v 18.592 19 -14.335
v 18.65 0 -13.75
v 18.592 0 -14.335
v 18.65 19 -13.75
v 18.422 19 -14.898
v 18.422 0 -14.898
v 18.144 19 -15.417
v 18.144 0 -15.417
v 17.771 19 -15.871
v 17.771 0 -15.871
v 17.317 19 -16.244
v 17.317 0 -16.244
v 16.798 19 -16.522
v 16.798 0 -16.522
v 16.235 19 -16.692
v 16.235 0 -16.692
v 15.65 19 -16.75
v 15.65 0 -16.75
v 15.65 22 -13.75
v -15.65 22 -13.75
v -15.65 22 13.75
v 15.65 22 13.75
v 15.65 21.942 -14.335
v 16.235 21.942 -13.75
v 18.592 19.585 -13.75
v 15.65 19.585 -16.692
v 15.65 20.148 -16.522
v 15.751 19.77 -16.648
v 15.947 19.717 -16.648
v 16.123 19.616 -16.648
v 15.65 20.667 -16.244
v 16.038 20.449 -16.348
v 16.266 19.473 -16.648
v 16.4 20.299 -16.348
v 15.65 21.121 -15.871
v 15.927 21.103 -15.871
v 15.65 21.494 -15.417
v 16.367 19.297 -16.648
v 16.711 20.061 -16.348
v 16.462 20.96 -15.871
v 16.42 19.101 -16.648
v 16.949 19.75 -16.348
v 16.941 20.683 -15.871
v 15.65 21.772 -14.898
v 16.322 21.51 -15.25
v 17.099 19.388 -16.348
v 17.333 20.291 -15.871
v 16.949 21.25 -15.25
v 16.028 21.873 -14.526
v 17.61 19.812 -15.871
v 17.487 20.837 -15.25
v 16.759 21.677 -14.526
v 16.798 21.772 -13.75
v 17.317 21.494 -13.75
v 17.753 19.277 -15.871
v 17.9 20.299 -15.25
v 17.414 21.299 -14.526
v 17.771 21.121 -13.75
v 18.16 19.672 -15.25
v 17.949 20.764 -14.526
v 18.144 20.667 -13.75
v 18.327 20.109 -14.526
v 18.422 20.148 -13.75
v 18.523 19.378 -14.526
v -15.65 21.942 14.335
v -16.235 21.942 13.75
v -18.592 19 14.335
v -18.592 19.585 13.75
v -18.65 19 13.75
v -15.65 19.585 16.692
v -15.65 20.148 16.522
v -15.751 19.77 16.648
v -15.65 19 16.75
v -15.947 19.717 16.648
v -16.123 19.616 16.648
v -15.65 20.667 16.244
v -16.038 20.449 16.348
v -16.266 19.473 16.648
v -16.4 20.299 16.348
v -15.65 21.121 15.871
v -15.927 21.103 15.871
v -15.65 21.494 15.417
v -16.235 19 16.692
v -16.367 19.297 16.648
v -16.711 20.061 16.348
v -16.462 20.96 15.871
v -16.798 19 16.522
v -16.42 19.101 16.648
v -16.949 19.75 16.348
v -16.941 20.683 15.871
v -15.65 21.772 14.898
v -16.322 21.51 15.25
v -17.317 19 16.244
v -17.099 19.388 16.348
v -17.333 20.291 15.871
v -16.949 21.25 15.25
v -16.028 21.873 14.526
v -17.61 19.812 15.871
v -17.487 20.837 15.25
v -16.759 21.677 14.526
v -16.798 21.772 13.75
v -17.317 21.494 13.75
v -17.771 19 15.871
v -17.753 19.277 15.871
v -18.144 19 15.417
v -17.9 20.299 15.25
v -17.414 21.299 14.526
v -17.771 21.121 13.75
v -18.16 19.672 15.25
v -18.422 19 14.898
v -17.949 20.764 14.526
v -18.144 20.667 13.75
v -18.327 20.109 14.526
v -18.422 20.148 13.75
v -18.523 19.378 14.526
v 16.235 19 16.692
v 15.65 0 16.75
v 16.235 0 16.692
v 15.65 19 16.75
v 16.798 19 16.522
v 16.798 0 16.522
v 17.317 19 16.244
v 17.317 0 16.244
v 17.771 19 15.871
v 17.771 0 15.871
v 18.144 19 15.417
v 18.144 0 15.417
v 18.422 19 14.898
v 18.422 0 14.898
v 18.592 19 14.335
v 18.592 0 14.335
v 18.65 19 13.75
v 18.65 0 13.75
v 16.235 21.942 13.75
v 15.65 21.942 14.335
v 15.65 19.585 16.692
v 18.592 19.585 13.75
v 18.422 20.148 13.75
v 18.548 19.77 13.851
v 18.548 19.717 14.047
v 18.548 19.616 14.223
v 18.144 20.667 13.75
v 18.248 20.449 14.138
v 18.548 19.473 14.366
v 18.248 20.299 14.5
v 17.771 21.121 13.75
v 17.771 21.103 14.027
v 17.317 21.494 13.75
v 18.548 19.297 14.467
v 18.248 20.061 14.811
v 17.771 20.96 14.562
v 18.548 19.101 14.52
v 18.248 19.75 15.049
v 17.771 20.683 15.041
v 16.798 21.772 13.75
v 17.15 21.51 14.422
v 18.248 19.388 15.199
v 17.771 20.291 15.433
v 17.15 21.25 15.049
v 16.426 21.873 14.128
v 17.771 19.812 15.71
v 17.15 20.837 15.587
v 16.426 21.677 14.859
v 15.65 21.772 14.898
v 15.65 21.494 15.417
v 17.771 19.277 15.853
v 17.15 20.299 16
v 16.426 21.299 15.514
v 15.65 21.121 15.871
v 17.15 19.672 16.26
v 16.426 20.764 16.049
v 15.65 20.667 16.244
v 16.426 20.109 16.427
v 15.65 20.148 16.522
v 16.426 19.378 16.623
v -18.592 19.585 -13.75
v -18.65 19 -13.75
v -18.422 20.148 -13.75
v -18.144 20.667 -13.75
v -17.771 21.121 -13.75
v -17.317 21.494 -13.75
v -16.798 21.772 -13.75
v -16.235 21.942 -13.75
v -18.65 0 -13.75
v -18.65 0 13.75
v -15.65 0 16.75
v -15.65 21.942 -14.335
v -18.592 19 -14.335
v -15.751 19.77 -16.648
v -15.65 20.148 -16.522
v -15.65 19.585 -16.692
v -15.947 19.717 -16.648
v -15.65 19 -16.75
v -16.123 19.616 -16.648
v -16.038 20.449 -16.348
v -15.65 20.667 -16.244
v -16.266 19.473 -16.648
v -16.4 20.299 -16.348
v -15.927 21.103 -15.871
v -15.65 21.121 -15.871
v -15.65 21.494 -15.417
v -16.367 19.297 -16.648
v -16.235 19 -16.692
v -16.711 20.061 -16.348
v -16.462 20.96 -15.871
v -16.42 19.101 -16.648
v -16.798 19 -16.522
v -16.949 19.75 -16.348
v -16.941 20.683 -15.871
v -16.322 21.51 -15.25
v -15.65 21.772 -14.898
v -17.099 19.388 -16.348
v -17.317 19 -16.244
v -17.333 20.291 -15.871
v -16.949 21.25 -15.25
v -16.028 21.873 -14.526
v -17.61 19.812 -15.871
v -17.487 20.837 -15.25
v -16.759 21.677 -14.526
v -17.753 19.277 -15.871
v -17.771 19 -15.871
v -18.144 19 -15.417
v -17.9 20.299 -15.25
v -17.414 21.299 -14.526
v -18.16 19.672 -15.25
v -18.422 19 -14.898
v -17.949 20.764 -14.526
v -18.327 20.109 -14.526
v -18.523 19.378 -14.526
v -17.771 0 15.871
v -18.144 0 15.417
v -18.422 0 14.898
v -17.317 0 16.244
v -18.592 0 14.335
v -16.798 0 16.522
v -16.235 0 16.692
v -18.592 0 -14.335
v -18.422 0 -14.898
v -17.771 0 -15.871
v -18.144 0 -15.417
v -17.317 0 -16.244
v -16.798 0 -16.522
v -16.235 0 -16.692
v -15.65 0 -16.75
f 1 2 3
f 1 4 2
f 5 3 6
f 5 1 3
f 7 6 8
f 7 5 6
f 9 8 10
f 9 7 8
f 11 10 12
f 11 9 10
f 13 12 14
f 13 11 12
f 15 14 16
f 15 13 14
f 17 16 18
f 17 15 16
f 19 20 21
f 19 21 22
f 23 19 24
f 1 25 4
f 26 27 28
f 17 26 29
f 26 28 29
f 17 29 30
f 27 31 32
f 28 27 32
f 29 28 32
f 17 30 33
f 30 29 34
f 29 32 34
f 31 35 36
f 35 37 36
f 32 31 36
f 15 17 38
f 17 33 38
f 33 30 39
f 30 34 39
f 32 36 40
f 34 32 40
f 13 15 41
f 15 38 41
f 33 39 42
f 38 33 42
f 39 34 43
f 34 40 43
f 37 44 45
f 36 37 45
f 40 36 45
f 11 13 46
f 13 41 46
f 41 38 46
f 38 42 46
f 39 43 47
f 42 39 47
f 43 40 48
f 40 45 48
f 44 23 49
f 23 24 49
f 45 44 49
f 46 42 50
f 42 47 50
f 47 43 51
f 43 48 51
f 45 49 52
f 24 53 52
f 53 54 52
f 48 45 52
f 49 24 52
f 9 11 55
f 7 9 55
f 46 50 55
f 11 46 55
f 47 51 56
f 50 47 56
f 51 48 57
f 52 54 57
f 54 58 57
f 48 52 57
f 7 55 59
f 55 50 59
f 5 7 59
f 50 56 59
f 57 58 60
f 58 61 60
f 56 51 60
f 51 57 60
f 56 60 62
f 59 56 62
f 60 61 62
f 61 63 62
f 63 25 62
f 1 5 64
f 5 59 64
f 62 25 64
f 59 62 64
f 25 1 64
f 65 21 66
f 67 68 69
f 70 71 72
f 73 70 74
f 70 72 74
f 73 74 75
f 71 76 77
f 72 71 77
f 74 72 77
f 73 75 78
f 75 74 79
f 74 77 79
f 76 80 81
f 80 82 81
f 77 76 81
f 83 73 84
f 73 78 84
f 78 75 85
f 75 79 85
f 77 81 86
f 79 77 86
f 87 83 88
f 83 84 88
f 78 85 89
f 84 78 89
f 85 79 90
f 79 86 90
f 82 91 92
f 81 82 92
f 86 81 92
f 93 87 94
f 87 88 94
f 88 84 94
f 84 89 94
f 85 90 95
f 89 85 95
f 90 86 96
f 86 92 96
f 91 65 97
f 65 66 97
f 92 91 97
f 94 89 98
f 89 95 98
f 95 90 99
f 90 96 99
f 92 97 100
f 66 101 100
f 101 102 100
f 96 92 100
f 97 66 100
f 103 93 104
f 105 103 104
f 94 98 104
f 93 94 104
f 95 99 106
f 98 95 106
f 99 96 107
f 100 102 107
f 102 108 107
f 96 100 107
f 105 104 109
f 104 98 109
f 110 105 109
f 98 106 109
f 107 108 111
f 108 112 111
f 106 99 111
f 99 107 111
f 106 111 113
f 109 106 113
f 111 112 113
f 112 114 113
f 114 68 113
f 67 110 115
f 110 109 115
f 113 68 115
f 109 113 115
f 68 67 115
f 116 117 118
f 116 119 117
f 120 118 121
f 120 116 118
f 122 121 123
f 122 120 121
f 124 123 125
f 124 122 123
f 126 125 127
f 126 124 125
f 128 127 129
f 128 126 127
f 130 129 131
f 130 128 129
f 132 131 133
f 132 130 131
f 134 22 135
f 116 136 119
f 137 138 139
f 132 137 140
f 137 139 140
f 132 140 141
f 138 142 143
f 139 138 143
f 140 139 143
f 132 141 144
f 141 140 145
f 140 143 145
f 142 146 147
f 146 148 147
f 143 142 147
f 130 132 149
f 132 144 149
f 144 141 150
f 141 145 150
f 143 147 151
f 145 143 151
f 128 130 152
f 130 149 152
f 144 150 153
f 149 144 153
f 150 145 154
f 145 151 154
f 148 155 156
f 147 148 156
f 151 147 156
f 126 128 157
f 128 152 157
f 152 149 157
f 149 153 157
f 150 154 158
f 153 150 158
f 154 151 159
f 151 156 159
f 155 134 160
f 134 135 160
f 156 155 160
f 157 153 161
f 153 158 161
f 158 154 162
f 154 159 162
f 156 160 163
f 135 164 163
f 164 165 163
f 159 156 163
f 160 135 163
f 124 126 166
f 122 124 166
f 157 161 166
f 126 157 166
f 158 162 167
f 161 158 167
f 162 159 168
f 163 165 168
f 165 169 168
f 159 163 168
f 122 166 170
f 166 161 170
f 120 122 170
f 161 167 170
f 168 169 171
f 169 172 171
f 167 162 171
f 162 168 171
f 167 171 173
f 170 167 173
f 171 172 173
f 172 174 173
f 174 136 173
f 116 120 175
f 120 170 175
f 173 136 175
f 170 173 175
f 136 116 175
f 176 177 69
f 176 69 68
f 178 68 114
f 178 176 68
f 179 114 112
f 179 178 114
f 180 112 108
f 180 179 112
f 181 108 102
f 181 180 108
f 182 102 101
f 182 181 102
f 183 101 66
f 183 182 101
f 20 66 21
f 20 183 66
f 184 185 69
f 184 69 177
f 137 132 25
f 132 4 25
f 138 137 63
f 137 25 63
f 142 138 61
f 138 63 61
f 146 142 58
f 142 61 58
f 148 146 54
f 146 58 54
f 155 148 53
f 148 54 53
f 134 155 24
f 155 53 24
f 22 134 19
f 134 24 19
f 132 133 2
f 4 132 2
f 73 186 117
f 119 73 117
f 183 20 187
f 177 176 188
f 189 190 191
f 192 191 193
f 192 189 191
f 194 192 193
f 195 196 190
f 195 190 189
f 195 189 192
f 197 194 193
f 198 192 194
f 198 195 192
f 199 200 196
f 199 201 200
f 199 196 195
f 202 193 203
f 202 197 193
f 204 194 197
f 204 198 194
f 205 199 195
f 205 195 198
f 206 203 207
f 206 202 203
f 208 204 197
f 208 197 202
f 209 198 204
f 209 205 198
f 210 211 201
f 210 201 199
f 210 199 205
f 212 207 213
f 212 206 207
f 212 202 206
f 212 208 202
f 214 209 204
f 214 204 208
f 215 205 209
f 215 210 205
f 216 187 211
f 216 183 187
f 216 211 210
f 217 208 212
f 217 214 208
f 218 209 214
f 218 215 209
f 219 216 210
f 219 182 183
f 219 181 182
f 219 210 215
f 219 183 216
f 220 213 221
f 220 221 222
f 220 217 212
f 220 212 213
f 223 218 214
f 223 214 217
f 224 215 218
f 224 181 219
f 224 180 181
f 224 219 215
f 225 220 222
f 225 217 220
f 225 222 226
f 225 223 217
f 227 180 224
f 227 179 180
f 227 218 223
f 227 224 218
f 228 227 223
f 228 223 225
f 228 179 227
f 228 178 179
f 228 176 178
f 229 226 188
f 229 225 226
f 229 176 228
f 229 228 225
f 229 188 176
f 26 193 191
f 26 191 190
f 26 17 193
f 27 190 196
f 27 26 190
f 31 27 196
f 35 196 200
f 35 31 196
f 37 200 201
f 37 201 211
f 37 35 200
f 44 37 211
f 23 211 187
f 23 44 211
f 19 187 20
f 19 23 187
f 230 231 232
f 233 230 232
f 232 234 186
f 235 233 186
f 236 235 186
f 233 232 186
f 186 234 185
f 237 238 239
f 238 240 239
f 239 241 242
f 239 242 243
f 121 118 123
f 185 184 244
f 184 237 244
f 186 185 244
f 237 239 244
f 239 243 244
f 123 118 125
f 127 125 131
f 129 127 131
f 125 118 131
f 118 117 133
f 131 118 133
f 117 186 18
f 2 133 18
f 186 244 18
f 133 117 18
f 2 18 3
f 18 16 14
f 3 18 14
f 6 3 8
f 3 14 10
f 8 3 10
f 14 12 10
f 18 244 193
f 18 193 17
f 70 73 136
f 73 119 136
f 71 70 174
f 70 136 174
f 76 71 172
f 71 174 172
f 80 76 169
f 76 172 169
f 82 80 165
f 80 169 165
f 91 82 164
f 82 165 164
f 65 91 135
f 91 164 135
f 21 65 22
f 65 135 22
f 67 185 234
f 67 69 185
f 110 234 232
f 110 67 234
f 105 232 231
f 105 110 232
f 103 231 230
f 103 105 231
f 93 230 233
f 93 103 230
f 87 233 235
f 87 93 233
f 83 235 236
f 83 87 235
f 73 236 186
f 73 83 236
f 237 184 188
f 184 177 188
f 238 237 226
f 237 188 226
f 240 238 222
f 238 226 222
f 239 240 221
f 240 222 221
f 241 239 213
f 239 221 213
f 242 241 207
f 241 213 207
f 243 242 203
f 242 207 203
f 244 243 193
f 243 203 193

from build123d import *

# Parameters (mm, degrees)
CROQUIS1_W              = 37.3
CROQUIS1_H              = 33.5
SALIENTE_EXTRUIR1_DEPTH = 22
REDONDEO1_R             = 3


with BuildPart() as part:
    # Croquis1 → Saliente-Extruir1 (new body)
    with BuildSketch(Plane(origin=(0, 0, 0), x_dir=(1, 0, 0), z_dir=(0, 1, 0))):
        Rectangle(CROQUIS1_W, CROQUIS1_H)
    extrude(amount=SALIENTE_EXTRUIR1_DEPTH)

    # Redondeo1
    redondeo1_edges = [part.edges().sort_by_distance(p)[0] for p in [
        (-18.65, 22, 0),
        (0, 22, 16.75),
        (18.65, 22, 0),
        (0, 22, -16.75),
        (18.65, 11, 16.75),
        (-18.65, 11, 16.75),
        (-18.65, 11, -16.75),
        (18.65, 11, -16.75),
    ]]
    fillet(redondeo1_edges, radius=REDONDEO1_R)


solid = part.part
